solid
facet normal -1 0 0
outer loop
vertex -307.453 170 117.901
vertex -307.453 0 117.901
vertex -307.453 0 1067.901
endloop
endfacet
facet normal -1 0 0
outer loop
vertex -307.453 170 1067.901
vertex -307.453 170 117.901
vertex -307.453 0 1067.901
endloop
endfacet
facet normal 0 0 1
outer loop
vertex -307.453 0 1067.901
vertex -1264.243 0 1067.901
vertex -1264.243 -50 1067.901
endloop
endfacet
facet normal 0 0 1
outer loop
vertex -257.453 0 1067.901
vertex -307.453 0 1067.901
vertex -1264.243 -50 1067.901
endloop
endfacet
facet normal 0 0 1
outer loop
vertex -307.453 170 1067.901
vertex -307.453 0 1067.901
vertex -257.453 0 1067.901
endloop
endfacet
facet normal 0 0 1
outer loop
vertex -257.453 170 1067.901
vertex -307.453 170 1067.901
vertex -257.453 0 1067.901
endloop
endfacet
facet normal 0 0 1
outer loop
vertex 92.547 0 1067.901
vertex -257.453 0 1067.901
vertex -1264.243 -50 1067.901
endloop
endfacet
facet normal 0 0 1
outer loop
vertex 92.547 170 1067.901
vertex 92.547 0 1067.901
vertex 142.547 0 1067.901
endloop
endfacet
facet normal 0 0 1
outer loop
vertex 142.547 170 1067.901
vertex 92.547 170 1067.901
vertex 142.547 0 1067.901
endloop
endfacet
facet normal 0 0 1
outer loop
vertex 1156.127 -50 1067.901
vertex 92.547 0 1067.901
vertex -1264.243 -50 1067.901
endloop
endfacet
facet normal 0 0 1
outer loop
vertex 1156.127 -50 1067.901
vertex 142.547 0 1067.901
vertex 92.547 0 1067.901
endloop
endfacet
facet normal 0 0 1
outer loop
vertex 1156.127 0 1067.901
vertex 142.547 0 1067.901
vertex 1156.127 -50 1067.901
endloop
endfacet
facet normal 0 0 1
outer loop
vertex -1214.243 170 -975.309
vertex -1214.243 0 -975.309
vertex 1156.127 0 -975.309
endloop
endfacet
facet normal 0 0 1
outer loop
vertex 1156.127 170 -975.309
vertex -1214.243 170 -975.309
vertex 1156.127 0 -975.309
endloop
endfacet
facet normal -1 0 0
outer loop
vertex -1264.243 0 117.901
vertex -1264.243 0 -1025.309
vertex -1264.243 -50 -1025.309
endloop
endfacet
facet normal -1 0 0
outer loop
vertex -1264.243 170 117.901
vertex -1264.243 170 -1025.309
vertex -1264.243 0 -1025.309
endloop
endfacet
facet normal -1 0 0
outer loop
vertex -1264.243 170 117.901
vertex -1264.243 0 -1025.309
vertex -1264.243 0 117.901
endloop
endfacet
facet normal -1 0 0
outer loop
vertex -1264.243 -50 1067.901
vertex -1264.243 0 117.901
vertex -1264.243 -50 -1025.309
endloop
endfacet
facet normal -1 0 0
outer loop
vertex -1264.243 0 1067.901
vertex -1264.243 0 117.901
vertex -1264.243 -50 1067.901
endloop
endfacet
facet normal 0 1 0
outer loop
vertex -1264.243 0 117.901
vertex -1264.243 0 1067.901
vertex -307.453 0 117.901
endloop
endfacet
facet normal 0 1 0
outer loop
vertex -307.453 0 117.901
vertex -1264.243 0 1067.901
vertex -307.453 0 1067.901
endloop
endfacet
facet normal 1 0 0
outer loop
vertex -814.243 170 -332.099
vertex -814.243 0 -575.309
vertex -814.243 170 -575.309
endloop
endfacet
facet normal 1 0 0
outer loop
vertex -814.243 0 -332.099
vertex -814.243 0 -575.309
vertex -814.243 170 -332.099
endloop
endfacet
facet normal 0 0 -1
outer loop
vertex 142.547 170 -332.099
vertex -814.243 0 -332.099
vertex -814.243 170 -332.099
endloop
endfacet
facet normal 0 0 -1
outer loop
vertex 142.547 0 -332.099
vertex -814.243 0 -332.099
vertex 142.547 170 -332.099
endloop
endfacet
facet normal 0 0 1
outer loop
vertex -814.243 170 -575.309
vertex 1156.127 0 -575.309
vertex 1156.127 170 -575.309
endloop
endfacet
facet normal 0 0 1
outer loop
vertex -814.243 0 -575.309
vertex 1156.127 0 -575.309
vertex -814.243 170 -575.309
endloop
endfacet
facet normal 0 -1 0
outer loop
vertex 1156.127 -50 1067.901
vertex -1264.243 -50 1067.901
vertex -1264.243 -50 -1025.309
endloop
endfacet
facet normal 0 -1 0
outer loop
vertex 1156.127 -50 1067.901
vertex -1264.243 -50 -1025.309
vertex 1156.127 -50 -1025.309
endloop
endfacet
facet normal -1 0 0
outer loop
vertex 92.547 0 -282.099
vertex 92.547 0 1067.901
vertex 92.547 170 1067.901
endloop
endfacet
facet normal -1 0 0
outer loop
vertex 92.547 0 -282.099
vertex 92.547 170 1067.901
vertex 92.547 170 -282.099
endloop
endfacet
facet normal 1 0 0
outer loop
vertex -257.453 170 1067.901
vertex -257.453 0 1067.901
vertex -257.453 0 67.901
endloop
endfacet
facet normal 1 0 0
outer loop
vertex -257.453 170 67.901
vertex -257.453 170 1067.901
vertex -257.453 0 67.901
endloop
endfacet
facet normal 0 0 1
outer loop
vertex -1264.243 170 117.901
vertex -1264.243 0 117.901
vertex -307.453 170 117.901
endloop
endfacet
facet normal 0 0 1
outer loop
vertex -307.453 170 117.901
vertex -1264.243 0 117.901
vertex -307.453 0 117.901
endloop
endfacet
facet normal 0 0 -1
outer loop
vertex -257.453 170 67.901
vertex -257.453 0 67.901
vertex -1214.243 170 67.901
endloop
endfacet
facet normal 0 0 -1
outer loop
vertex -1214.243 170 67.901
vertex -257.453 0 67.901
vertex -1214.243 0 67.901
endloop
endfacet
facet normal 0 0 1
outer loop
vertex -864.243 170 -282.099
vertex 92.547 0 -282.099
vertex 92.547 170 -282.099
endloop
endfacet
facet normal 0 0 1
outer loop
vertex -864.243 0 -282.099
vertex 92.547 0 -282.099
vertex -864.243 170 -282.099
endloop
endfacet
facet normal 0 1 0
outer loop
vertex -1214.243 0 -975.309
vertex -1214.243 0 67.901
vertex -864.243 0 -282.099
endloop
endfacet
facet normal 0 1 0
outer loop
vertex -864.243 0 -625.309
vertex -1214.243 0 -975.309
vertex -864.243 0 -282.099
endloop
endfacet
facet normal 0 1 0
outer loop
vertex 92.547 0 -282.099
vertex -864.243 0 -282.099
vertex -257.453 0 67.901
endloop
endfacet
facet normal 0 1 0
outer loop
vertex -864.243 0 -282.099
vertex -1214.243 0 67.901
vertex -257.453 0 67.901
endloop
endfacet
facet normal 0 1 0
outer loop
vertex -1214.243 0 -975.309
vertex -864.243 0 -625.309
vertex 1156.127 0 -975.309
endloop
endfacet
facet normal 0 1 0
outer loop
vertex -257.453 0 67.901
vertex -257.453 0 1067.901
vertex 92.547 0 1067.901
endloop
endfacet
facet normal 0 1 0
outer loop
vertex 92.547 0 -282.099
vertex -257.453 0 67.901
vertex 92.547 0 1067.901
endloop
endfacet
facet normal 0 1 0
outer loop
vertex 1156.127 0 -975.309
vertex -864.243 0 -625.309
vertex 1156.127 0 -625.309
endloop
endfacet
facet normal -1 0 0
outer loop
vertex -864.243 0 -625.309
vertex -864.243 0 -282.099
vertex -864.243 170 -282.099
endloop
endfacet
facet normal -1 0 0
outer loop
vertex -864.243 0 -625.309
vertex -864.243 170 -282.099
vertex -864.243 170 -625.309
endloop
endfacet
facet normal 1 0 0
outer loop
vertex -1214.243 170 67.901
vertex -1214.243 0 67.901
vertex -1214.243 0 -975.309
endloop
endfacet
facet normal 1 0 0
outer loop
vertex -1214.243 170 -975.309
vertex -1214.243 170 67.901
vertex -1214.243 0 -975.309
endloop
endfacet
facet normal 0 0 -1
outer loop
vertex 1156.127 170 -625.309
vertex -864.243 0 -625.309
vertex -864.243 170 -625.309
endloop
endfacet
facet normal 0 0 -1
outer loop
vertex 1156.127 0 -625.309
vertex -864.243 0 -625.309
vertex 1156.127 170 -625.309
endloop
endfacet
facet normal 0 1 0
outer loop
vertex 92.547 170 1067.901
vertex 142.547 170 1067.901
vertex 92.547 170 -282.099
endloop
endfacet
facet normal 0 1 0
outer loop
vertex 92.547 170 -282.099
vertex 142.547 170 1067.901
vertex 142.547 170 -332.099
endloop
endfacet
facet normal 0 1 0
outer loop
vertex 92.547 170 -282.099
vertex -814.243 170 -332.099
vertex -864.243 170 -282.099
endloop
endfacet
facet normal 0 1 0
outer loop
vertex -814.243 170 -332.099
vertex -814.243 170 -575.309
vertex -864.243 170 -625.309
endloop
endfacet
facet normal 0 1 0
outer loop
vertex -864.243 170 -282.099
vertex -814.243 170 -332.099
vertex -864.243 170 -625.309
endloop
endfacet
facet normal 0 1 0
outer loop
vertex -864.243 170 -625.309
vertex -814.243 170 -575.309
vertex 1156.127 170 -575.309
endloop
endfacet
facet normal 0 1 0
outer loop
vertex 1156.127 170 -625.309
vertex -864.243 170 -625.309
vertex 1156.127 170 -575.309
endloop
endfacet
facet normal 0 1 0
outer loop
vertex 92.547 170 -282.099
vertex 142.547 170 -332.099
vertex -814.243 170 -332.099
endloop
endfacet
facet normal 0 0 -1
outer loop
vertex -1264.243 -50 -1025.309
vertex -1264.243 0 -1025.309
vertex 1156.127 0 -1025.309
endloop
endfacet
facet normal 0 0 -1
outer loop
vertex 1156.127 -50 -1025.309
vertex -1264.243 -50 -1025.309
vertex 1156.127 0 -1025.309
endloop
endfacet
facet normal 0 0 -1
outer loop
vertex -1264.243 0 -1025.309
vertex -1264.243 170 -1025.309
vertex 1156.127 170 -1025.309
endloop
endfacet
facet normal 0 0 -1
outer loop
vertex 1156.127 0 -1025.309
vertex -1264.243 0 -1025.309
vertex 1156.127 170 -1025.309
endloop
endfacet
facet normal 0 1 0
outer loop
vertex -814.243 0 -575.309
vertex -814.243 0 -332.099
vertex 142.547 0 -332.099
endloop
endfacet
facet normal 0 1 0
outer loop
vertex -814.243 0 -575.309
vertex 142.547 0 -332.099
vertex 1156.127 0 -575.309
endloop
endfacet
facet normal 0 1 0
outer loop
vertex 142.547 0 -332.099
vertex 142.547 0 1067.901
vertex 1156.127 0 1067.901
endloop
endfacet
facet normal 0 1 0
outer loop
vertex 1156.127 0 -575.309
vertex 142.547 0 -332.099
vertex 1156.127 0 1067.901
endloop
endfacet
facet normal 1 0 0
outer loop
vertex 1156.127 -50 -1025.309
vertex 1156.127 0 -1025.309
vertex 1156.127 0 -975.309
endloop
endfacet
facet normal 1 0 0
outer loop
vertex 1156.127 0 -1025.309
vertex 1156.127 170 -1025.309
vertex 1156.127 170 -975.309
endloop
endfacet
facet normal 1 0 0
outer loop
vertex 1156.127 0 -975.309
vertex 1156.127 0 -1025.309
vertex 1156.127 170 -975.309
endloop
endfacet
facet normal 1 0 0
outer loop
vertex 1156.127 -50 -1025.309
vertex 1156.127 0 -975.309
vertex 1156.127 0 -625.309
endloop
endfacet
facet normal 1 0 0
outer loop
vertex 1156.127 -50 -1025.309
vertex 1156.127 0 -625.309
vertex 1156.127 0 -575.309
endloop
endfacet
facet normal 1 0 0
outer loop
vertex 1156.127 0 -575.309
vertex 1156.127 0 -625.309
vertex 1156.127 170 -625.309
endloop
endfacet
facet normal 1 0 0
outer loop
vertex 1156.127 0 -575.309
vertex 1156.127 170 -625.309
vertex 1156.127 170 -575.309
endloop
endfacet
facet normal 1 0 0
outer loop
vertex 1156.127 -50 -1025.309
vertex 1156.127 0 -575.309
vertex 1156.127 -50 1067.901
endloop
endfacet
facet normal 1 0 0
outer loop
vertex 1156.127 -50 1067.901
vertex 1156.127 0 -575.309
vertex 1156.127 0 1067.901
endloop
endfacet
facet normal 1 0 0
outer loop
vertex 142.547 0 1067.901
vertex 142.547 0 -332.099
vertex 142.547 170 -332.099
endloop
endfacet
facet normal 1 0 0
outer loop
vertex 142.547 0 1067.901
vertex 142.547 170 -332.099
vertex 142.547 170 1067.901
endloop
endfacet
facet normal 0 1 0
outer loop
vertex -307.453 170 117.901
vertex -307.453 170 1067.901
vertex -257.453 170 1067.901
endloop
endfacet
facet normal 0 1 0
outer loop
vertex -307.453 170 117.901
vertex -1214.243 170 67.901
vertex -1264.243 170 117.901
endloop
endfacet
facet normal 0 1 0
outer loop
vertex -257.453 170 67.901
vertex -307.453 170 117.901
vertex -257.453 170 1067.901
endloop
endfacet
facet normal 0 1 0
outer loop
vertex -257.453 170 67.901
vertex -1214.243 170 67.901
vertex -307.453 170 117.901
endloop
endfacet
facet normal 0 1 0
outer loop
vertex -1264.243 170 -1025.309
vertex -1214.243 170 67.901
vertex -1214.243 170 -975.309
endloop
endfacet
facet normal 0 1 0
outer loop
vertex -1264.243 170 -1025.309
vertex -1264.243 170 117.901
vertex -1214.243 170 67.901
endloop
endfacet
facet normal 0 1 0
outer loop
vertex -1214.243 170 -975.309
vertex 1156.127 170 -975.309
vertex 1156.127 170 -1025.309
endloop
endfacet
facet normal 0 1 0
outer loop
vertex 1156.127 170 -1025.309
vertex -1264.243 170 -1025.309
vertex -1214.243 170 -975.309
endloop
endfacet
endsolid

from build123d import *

# Parameters (mm, degrees)
BOSS_EXTRUDE1_DEPTH   = 170
BOSS_EXTRUDE1_2_DEPTH = 170
SKETCH2_W             = 2420.37037037
SKETCH2_H             = 2093.209876543
BOSS_EXTRUDE2_DEPTH   = 50


with BuildPart() as part:
    # Sketch1 → Boss-Extrude1 (new body)
    with BuildSketch(Plane(origin=(0, 0, 0), x_dir=(1, 0, 0), z_dir=(0, 1, 0))):
        Polygon((-257.453122603, -1067.901234568), (-257.453122603, -67.901234568), (-1214.243246059, -67.901234568), (-1214.243246059, 975.308641975), (1156.127124311, 975.308641975), (1156.127124311, 1025.308641975), (-1264.243246059, 1025.308641975), (-1264.243246059, -117.901234568), (-307.453122603, -117.901234568), (-307.453122603, -1067.901234568), align=None)
    extrude(amount=BOSS_EXTRUDE1_DEPTH)



with BuildPart() as body_2:
    # Sketch1 → Boss-Extrude1 2 (new body)
    with BuildSketch(Plane(origin=(0, 0, 0), x_dir=(1, 0, 0), z_dir=(0, 1, 0))):
        Polygon((92.546877397, -1067.901234568), (92.546877397, 282.098765432), (-864.243246059, 282.098765432), (-864.243246059, 625.308641975), (1156.127124311, 625.308641975), (1156.127124311, 575.308641975), (-814.243246059, 575.308641975), (-814.243246059, 332.098765432), (142.546877397, 332.098765432), (142.546877397, -1067.901234568), align=None)
    extrude(amount=BOSS_EXTRUDE1_2_DEPTH)


with BuildPart() as part_1:
    add(part.part)

    add(body_2.part)  # Boss-Extrude2 merges body 2
    # Sketch2 → Boss-Extrude2 (add)
    with BuildSketch(Plane.XZ):
        with Locations((-54.058060874, 21.296296297)):
            Rectangle(SKETCH2_W, SKETCH2_H)
    extrude(amount=BOSS_EXTRUDE2_DEPTH)


solid = part_1.part
